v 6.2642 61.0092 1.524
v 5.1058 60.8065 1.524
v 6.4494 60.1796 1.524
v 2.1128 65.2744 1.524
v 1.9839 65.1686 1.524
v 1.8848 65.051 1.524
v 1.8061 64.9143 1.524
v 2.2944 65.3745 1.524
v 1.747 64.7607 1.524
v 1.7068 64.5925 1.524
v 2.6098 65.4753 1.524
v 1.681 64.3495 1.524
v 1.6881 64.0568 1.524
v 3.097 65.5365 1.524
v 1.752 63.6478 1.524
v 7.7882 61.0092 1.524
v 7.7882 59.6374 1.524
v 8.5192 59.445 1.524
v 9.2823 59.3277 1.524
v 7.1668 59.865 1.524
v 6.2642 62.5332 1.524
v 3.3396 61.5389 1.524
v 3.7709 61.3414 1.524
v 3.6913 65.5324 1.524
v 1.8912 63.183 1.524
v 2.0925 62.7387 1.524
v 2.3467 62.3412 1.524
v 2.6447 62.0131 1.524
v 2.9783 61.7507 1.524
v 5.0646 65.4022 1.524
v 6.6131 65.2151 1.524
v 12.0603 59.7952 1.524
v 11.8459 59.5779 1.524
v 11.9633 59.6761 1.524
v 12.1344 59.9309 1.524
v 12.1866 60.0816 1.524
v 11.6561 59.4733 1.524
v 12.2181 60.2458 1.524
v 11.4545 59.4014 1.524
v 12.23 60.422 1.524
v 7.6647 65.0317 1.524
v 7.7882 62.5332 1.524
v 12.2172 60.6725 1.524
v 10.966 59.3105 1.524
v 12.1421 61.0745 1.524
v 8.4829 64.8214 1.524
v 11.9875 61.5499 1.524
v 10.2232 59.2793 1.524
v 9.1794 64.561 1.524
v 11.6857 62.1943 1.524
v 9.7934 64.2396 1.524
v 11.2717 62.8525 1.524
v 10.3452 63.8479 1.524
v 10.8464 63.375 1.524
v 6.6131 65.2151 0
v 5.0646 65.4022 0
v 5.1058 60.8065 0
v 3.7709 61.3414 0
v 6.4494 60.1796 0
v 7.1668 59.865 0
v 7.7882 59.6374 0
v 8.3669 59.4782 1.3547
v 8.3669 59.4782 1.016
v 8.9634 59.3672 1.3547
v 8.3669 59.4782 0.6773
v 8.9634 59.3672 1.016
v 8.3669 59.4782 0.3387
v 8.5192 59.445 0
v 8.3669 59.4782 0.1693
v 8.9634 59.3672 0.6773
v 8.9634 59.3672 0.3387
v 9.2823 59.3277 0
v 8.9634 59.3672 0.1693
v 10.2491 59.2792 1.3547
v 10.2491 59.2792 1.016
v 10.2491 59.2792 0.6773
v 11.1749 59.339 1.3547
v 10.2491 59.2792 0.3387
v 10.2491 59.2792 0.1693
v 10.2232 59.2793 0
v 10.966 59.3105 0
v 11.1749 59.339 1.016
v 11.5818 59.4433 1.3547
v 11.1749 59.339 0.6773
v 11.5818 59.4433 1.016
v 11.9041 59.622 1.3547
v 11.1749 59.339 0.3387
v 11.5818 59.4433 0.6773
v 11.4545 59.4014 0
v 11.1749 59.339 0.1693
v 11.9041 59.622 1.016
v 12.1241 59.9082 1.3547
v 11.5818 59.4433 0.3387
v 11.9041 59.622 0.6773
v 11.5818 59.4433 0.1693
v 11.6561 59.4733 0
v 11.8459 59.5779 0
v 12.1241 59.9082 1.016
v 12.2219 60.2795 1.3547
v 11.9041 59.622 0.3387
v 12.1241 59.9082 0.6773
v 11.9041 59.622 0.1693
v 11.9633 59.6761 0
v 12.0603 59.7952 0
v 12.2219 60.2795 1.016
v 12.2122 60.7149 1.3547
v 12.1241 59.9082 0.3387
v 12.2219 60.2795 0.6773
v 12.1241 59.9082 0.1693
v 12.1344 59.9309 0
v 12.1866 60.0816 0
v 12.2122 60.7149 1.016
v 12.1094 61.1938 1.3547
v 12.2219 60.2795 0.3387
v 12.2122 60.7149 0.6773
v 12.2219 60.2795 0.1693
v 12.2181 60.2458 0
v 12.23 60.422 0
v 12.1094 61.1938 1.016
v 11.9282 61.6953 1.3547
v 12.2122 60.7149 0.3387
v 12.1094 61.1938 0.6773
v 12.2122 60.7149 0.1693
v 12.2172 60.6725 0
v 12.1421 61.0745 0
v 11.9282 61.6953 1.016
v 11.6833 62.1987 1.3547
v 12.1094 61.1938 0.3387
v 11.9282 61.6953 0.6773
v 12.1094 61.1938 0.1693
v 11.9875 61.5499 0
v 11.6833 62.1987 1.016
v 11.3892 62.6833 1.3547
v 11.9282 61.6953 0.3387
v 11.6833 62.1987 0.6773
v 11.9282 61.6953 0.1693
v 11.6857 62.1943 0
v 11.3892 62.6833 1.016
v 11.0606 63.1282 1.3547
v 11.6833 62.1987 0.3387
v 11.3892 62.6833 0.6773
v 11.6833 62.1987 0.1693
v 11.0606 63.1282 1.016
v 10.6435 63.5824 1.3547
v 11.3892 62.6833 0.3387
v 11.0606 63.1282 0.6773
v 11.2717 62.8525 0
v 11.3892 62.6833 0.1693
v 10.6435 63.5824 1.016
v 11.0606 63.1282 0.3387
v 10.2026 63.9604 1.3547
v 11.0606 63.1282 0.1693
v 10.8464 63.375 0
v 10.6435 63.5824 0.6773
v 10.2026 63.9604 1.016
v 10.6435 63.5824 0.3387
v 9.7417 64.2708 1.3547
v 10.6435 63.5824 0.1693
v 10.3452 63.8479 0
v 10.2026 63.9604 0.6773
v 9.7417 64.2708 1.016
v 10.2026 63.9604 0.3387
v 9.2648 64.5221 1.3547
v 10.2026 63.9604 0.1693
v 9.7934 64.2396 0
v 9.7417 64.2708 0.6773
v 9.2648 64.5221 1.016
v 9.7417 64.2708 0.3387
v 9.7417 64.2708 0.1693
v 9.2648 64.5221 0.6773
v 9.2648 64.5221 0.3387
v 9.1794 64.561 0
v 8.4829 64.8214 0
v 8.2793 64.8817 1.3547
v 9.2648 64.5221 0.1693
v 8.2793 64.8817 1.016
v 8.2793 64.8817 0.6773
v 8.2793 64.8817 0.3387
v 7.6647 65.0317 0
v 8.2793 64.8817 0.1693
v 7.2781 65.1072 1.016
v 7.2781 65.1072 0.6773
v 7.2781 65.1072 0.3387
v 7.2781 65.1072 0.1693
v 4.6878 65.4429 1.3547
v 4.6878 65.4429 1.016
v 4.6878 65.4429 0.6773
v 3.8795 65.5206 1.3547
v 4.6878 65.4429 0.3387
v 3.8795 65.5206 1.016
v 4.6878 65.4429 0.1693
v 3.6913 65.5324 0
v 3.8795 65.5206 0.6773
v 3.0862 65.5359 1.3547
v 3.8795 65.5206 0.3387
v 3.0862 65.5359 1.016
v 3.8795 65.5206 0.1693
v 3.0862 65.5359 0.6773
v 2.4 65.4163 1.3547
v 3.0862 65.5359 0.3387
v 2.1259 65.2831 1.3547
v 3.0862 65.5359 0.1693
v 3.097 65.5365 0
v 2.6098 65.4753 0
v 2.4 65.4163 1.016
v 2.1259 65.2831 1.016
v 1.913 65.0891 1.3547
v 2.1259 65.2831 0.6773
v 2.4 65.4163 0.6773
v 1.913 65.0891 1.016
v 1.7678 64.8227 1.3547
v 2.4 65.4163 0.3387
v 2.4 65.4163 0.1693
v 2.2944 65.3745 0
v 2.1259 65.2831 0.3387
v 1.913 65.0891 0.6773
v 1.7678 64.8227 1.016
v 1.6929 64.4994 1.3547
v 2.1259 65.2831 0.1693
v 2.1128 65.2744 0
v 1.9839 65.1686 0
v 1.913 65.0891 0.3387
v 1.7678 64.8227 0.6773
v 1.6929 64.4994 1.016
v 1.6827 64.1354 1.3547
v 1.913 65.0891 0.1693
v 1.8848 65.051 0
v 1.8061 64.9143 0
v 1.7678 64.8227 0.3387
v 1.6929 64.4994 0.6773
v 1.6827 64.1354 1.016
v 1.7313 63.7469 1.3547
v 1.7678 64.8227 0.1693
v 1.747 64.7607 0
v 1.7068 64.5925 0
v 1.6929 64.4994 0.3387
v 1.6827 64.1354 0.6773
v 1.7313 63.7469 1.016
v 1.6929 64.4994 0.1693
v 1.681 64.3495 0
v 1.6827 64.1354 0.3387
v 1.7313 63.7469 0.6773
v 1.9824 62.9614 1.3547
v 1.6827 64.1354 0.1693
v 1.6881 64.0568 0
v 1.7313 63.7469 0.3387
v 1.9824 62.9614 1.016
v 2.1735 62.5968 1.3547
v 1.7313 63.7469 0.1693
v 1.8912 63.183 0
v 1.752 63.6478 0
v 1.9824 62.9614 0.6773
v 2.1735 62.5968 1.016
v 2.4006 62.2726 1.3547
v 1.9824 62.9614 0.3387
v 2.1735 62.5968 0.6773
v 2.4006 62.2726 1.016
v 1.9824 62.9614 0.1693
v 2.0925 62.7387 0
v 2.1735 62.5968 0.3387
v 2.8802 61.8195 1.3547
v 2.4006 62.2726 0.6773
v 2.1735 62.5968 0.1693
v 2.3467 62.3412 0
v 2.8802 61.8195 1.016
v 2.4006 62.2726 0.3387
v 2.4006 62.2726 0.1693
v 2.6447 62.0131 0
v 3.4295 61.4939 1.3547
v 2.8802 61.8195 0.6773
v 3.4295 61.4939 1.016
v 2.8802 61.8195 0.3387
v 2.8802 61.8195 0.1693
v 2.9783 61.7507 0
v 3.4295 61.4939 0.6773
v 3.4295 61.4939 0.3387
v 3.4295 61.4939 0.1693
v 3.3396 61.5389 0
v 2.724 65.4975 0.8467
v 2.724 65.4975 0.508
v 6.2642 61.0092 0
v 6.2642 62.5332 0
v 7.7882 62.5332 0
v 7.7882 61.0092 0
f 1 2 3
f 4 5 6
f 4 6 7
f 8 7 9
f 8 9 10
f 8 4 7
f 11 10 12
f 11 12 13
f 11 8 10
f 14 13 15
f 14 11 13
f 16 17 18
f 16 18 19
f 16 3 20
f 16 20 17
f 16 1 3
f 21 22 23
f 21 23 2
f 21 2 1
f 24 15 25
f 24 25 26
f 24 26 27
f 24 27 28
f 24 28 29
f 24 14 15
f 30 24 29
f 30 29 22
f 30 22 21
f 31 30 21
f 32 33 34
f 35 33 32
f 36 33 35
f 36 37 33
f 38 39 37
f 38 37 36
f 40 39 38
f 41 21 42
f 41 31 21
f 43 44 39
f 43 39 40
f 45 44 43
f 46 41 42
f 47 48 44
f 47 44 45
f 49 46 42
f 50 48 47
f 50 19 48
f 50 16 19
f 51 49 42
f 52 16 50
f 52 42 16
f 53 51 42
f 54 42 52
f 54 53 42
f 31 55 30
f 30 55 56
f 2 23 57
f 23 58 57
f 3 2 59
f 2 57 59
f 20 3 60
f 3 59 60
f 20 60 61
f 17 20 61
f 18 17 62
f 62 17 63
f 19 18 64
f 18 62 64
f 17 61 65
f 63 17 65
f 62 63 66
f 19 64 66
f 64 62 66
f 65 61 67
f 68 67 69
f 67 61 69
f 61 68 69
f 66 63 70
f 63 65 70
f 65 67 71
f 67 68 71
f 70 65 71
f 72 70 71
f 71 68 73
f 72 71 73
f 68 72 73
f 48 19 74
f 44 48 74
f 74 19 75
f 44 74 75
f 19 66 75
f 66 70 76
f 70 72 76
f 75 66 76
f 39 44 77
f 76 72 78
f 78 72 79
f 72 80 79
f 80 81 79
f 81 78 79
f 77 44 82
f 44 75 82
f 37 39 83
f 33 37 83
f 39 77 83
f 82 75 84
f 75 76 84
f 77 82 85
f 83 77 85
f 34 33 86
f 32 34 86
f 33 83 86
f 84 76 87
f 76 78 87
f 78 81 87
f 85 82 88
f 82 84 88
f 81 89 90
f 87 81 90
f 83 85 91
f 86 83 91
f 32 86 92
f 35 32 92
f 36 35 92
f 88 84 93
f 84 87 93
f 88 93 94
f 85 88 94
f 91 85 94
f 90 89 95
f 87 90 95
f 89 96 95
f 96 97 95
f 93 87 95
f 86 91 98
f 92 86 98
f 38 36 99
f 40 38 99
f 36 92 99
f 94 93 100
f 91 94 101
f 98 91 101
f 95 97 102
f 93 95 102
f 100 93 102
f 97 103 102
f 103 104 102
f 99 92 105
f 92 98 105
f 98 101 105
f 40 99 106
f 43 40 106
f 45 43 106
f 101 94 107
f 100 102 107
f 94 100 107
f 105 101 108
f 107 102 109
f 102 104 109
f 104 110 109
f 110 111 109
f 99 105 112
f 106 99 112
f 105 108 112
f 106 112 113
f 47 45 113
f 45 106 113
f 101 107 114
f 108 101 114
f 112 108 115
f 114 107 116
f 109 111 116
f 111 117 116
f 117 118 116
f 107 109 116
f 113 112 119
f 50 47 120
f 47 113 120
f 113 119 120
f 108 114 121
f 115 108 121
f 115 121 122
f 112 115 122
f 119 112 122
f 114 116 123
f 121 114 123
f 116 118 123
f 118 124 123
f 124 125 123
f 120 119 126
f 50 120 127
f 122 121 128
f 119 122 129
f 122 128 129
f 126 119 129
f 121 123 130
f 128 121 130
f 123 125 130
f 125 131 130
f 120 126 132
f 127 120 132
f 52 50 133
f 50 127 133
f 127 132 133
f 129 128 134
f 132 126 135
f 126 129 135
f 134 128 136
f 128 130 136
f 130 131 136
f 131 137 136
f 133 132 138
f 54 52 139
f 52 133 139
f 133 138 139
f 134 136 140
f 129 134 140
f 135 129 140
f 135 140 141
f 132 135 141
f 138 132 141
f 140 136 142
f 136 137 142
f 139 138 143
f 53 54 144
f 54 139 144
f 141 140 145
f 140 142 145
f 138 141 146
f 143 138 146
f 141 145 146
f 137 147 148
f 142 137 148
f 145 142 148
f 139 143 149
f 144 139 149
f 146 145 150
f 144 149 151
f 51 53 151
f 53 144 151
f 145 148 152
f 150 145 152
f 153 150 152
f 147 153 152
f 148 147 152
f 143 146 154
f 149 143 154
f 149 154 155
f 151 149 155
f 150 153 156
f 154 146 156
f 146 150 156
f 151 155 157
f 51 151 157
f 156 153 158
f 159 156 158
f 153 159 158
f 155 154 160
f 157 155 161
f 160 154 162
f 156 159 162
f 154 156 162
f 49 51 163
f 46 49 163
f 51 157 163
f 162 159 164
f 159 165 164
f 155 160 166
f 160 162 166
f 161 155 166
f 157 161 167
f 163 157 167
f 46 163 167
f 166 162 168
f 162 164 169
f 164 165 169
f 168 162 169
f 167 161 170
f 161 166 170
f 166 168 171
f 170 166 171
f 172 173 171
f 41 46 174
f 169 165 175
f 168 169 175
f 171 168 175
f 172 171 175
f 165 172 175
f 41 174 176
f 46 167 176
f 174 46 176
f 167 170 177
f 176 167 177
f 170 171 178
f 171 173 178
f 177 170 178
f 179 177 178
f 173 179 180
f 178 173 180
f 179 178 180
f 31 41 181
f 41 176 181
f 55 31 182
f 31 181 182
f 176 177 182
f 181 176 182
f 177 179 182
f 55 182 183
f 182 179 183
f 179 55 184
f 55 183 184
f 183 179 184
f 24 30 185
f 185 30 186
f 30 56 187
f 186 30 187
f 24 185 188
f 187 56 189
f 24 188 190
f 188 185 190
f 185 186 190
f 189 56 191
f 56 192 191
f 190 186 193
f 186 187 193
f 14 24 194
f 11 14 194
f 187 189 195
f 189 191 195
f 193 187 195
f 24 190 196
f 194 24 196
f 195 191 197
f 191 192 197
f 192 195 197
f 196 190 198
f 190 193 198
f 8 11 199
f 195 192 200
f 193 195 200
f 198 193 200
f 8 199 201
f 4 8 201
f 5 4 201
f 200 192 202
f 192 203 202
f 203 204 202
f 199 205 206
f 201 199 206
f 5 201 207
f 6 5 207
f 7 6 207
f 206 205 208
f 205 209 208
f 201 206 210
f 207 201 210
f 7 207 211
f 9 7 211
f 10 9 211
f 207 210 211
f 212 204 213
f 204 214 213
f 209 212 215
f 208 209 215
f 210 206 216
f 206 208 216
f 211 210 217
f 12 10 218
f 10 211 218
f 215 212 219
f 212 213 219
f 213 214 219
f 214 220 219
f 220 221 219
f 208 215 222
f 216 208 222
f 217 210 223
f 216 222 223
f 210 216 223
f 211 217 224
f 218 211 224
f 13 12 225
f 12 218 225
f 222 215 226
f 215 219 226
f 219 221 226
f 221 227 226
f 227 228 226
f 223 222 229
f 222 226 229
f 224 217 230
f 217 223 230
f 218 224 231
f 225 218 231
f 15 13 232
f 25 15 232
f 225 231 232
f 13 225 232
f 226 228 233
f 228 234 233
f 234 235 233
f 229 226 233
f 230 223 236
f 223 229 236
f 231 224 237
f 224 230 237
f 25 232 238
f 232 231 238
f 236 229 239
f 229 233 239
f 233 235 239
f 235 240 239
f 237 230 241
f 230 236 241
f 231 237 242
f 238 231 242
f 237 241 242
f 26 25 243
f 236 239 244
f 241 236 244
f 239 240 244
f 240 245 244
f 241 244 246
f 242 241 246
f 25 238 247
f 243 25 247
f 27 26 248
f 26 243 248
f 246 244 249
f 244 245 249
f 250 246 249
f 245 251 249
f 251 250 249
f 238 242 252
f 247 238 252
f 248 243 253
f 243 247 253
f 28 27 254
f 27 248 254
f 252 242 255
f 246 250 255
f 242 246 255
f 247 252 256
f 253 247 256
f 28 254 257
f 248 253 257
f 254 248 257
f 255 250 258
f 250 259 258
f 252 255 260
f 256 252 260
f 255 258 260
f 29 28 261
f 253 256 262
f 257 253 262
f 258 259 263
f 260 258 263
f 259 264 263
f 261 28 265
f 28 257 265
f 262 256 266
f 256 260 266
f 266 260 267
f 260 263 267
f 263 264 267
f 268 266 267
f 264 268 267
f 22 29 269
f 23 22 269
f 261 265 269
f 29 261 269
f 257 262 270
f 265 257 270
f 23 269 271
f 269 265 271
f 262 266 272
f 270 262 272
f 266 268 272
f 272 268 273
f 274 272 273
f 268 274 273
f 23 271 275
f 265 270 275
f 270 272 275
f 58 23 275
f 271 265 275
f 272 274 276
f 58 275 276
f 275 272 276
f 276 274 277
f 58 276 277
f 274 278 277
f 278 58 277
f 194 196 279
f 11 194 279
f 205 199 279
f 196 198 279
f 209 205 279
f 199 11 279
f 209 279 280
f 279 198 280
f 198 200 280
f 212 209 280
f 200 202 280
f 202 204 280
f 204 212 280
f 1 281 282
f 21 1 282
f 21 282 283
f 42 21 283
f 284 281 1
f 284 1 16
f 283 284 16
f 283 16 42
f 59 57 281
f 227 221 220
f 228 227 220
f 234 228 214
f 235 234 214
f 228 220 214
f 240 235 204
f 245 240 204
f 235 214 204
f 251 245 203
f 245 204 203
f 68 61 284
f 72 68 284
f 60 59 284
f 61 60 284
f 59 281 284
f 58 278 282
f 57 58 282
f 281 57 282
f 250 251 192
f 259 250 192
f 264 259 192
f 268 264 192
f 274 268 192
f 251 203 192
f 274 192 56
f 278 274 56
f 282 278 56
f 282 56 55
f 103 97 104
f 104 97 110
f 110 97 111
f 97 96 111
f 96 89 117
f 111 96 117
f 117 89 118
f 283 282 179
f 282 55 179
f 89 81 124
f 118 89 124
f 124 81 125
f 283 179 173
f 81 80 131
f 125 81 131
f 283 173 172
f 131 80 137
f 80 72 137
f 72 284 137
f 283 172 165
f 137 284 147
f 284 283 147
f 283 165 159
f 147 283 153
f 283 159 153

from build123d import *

# Parameters (mm, degrees)
SKETCH1_W           = 1.524
SKETCH1_H           = 1.524
BOSS_EXTRUDE1_DEPTH = 1.524


with BuildPart() as part:
    # Sketch1 → Boss-Extrude1 (new body)
    with BuildSketch(Plane.XY):
        with BuildLine():
            add(Edge.make_bspline(
                [(7.788210834, 59.637377536), (8.552428619, 59.392019525), (9.87105853, 59.206525155), (12.993309012, 59.429050375), (11.145278004, 64.095820828), (7.76826039, 65.120861798), (4.810343538, 65.425230024), (1.108944301, 65.8389715), (2.042949609, 61.815529916), (4.953229398, 61.021597327), (6.729033119, 59.977434705), (7.788210834, 59.637377536)],
                knots=[0, 0, 0, 0, 0.094464638, 0.15866288, 0.295651603, 0.457810616, 0.557025317, 0.663282087, 0.771859744, 0.86907549, 1, 1, 1, 1], degree=3))
        make_face()
        with Locations((7.026210834, 61.771154306)):
            Rectangle(SKETCH1_W, SKETCH1_H, mode=Mode.SUBTRACT)
    extrude(amount=BOSS_EXTRUDE1_DEPTH)


solid = part.part
